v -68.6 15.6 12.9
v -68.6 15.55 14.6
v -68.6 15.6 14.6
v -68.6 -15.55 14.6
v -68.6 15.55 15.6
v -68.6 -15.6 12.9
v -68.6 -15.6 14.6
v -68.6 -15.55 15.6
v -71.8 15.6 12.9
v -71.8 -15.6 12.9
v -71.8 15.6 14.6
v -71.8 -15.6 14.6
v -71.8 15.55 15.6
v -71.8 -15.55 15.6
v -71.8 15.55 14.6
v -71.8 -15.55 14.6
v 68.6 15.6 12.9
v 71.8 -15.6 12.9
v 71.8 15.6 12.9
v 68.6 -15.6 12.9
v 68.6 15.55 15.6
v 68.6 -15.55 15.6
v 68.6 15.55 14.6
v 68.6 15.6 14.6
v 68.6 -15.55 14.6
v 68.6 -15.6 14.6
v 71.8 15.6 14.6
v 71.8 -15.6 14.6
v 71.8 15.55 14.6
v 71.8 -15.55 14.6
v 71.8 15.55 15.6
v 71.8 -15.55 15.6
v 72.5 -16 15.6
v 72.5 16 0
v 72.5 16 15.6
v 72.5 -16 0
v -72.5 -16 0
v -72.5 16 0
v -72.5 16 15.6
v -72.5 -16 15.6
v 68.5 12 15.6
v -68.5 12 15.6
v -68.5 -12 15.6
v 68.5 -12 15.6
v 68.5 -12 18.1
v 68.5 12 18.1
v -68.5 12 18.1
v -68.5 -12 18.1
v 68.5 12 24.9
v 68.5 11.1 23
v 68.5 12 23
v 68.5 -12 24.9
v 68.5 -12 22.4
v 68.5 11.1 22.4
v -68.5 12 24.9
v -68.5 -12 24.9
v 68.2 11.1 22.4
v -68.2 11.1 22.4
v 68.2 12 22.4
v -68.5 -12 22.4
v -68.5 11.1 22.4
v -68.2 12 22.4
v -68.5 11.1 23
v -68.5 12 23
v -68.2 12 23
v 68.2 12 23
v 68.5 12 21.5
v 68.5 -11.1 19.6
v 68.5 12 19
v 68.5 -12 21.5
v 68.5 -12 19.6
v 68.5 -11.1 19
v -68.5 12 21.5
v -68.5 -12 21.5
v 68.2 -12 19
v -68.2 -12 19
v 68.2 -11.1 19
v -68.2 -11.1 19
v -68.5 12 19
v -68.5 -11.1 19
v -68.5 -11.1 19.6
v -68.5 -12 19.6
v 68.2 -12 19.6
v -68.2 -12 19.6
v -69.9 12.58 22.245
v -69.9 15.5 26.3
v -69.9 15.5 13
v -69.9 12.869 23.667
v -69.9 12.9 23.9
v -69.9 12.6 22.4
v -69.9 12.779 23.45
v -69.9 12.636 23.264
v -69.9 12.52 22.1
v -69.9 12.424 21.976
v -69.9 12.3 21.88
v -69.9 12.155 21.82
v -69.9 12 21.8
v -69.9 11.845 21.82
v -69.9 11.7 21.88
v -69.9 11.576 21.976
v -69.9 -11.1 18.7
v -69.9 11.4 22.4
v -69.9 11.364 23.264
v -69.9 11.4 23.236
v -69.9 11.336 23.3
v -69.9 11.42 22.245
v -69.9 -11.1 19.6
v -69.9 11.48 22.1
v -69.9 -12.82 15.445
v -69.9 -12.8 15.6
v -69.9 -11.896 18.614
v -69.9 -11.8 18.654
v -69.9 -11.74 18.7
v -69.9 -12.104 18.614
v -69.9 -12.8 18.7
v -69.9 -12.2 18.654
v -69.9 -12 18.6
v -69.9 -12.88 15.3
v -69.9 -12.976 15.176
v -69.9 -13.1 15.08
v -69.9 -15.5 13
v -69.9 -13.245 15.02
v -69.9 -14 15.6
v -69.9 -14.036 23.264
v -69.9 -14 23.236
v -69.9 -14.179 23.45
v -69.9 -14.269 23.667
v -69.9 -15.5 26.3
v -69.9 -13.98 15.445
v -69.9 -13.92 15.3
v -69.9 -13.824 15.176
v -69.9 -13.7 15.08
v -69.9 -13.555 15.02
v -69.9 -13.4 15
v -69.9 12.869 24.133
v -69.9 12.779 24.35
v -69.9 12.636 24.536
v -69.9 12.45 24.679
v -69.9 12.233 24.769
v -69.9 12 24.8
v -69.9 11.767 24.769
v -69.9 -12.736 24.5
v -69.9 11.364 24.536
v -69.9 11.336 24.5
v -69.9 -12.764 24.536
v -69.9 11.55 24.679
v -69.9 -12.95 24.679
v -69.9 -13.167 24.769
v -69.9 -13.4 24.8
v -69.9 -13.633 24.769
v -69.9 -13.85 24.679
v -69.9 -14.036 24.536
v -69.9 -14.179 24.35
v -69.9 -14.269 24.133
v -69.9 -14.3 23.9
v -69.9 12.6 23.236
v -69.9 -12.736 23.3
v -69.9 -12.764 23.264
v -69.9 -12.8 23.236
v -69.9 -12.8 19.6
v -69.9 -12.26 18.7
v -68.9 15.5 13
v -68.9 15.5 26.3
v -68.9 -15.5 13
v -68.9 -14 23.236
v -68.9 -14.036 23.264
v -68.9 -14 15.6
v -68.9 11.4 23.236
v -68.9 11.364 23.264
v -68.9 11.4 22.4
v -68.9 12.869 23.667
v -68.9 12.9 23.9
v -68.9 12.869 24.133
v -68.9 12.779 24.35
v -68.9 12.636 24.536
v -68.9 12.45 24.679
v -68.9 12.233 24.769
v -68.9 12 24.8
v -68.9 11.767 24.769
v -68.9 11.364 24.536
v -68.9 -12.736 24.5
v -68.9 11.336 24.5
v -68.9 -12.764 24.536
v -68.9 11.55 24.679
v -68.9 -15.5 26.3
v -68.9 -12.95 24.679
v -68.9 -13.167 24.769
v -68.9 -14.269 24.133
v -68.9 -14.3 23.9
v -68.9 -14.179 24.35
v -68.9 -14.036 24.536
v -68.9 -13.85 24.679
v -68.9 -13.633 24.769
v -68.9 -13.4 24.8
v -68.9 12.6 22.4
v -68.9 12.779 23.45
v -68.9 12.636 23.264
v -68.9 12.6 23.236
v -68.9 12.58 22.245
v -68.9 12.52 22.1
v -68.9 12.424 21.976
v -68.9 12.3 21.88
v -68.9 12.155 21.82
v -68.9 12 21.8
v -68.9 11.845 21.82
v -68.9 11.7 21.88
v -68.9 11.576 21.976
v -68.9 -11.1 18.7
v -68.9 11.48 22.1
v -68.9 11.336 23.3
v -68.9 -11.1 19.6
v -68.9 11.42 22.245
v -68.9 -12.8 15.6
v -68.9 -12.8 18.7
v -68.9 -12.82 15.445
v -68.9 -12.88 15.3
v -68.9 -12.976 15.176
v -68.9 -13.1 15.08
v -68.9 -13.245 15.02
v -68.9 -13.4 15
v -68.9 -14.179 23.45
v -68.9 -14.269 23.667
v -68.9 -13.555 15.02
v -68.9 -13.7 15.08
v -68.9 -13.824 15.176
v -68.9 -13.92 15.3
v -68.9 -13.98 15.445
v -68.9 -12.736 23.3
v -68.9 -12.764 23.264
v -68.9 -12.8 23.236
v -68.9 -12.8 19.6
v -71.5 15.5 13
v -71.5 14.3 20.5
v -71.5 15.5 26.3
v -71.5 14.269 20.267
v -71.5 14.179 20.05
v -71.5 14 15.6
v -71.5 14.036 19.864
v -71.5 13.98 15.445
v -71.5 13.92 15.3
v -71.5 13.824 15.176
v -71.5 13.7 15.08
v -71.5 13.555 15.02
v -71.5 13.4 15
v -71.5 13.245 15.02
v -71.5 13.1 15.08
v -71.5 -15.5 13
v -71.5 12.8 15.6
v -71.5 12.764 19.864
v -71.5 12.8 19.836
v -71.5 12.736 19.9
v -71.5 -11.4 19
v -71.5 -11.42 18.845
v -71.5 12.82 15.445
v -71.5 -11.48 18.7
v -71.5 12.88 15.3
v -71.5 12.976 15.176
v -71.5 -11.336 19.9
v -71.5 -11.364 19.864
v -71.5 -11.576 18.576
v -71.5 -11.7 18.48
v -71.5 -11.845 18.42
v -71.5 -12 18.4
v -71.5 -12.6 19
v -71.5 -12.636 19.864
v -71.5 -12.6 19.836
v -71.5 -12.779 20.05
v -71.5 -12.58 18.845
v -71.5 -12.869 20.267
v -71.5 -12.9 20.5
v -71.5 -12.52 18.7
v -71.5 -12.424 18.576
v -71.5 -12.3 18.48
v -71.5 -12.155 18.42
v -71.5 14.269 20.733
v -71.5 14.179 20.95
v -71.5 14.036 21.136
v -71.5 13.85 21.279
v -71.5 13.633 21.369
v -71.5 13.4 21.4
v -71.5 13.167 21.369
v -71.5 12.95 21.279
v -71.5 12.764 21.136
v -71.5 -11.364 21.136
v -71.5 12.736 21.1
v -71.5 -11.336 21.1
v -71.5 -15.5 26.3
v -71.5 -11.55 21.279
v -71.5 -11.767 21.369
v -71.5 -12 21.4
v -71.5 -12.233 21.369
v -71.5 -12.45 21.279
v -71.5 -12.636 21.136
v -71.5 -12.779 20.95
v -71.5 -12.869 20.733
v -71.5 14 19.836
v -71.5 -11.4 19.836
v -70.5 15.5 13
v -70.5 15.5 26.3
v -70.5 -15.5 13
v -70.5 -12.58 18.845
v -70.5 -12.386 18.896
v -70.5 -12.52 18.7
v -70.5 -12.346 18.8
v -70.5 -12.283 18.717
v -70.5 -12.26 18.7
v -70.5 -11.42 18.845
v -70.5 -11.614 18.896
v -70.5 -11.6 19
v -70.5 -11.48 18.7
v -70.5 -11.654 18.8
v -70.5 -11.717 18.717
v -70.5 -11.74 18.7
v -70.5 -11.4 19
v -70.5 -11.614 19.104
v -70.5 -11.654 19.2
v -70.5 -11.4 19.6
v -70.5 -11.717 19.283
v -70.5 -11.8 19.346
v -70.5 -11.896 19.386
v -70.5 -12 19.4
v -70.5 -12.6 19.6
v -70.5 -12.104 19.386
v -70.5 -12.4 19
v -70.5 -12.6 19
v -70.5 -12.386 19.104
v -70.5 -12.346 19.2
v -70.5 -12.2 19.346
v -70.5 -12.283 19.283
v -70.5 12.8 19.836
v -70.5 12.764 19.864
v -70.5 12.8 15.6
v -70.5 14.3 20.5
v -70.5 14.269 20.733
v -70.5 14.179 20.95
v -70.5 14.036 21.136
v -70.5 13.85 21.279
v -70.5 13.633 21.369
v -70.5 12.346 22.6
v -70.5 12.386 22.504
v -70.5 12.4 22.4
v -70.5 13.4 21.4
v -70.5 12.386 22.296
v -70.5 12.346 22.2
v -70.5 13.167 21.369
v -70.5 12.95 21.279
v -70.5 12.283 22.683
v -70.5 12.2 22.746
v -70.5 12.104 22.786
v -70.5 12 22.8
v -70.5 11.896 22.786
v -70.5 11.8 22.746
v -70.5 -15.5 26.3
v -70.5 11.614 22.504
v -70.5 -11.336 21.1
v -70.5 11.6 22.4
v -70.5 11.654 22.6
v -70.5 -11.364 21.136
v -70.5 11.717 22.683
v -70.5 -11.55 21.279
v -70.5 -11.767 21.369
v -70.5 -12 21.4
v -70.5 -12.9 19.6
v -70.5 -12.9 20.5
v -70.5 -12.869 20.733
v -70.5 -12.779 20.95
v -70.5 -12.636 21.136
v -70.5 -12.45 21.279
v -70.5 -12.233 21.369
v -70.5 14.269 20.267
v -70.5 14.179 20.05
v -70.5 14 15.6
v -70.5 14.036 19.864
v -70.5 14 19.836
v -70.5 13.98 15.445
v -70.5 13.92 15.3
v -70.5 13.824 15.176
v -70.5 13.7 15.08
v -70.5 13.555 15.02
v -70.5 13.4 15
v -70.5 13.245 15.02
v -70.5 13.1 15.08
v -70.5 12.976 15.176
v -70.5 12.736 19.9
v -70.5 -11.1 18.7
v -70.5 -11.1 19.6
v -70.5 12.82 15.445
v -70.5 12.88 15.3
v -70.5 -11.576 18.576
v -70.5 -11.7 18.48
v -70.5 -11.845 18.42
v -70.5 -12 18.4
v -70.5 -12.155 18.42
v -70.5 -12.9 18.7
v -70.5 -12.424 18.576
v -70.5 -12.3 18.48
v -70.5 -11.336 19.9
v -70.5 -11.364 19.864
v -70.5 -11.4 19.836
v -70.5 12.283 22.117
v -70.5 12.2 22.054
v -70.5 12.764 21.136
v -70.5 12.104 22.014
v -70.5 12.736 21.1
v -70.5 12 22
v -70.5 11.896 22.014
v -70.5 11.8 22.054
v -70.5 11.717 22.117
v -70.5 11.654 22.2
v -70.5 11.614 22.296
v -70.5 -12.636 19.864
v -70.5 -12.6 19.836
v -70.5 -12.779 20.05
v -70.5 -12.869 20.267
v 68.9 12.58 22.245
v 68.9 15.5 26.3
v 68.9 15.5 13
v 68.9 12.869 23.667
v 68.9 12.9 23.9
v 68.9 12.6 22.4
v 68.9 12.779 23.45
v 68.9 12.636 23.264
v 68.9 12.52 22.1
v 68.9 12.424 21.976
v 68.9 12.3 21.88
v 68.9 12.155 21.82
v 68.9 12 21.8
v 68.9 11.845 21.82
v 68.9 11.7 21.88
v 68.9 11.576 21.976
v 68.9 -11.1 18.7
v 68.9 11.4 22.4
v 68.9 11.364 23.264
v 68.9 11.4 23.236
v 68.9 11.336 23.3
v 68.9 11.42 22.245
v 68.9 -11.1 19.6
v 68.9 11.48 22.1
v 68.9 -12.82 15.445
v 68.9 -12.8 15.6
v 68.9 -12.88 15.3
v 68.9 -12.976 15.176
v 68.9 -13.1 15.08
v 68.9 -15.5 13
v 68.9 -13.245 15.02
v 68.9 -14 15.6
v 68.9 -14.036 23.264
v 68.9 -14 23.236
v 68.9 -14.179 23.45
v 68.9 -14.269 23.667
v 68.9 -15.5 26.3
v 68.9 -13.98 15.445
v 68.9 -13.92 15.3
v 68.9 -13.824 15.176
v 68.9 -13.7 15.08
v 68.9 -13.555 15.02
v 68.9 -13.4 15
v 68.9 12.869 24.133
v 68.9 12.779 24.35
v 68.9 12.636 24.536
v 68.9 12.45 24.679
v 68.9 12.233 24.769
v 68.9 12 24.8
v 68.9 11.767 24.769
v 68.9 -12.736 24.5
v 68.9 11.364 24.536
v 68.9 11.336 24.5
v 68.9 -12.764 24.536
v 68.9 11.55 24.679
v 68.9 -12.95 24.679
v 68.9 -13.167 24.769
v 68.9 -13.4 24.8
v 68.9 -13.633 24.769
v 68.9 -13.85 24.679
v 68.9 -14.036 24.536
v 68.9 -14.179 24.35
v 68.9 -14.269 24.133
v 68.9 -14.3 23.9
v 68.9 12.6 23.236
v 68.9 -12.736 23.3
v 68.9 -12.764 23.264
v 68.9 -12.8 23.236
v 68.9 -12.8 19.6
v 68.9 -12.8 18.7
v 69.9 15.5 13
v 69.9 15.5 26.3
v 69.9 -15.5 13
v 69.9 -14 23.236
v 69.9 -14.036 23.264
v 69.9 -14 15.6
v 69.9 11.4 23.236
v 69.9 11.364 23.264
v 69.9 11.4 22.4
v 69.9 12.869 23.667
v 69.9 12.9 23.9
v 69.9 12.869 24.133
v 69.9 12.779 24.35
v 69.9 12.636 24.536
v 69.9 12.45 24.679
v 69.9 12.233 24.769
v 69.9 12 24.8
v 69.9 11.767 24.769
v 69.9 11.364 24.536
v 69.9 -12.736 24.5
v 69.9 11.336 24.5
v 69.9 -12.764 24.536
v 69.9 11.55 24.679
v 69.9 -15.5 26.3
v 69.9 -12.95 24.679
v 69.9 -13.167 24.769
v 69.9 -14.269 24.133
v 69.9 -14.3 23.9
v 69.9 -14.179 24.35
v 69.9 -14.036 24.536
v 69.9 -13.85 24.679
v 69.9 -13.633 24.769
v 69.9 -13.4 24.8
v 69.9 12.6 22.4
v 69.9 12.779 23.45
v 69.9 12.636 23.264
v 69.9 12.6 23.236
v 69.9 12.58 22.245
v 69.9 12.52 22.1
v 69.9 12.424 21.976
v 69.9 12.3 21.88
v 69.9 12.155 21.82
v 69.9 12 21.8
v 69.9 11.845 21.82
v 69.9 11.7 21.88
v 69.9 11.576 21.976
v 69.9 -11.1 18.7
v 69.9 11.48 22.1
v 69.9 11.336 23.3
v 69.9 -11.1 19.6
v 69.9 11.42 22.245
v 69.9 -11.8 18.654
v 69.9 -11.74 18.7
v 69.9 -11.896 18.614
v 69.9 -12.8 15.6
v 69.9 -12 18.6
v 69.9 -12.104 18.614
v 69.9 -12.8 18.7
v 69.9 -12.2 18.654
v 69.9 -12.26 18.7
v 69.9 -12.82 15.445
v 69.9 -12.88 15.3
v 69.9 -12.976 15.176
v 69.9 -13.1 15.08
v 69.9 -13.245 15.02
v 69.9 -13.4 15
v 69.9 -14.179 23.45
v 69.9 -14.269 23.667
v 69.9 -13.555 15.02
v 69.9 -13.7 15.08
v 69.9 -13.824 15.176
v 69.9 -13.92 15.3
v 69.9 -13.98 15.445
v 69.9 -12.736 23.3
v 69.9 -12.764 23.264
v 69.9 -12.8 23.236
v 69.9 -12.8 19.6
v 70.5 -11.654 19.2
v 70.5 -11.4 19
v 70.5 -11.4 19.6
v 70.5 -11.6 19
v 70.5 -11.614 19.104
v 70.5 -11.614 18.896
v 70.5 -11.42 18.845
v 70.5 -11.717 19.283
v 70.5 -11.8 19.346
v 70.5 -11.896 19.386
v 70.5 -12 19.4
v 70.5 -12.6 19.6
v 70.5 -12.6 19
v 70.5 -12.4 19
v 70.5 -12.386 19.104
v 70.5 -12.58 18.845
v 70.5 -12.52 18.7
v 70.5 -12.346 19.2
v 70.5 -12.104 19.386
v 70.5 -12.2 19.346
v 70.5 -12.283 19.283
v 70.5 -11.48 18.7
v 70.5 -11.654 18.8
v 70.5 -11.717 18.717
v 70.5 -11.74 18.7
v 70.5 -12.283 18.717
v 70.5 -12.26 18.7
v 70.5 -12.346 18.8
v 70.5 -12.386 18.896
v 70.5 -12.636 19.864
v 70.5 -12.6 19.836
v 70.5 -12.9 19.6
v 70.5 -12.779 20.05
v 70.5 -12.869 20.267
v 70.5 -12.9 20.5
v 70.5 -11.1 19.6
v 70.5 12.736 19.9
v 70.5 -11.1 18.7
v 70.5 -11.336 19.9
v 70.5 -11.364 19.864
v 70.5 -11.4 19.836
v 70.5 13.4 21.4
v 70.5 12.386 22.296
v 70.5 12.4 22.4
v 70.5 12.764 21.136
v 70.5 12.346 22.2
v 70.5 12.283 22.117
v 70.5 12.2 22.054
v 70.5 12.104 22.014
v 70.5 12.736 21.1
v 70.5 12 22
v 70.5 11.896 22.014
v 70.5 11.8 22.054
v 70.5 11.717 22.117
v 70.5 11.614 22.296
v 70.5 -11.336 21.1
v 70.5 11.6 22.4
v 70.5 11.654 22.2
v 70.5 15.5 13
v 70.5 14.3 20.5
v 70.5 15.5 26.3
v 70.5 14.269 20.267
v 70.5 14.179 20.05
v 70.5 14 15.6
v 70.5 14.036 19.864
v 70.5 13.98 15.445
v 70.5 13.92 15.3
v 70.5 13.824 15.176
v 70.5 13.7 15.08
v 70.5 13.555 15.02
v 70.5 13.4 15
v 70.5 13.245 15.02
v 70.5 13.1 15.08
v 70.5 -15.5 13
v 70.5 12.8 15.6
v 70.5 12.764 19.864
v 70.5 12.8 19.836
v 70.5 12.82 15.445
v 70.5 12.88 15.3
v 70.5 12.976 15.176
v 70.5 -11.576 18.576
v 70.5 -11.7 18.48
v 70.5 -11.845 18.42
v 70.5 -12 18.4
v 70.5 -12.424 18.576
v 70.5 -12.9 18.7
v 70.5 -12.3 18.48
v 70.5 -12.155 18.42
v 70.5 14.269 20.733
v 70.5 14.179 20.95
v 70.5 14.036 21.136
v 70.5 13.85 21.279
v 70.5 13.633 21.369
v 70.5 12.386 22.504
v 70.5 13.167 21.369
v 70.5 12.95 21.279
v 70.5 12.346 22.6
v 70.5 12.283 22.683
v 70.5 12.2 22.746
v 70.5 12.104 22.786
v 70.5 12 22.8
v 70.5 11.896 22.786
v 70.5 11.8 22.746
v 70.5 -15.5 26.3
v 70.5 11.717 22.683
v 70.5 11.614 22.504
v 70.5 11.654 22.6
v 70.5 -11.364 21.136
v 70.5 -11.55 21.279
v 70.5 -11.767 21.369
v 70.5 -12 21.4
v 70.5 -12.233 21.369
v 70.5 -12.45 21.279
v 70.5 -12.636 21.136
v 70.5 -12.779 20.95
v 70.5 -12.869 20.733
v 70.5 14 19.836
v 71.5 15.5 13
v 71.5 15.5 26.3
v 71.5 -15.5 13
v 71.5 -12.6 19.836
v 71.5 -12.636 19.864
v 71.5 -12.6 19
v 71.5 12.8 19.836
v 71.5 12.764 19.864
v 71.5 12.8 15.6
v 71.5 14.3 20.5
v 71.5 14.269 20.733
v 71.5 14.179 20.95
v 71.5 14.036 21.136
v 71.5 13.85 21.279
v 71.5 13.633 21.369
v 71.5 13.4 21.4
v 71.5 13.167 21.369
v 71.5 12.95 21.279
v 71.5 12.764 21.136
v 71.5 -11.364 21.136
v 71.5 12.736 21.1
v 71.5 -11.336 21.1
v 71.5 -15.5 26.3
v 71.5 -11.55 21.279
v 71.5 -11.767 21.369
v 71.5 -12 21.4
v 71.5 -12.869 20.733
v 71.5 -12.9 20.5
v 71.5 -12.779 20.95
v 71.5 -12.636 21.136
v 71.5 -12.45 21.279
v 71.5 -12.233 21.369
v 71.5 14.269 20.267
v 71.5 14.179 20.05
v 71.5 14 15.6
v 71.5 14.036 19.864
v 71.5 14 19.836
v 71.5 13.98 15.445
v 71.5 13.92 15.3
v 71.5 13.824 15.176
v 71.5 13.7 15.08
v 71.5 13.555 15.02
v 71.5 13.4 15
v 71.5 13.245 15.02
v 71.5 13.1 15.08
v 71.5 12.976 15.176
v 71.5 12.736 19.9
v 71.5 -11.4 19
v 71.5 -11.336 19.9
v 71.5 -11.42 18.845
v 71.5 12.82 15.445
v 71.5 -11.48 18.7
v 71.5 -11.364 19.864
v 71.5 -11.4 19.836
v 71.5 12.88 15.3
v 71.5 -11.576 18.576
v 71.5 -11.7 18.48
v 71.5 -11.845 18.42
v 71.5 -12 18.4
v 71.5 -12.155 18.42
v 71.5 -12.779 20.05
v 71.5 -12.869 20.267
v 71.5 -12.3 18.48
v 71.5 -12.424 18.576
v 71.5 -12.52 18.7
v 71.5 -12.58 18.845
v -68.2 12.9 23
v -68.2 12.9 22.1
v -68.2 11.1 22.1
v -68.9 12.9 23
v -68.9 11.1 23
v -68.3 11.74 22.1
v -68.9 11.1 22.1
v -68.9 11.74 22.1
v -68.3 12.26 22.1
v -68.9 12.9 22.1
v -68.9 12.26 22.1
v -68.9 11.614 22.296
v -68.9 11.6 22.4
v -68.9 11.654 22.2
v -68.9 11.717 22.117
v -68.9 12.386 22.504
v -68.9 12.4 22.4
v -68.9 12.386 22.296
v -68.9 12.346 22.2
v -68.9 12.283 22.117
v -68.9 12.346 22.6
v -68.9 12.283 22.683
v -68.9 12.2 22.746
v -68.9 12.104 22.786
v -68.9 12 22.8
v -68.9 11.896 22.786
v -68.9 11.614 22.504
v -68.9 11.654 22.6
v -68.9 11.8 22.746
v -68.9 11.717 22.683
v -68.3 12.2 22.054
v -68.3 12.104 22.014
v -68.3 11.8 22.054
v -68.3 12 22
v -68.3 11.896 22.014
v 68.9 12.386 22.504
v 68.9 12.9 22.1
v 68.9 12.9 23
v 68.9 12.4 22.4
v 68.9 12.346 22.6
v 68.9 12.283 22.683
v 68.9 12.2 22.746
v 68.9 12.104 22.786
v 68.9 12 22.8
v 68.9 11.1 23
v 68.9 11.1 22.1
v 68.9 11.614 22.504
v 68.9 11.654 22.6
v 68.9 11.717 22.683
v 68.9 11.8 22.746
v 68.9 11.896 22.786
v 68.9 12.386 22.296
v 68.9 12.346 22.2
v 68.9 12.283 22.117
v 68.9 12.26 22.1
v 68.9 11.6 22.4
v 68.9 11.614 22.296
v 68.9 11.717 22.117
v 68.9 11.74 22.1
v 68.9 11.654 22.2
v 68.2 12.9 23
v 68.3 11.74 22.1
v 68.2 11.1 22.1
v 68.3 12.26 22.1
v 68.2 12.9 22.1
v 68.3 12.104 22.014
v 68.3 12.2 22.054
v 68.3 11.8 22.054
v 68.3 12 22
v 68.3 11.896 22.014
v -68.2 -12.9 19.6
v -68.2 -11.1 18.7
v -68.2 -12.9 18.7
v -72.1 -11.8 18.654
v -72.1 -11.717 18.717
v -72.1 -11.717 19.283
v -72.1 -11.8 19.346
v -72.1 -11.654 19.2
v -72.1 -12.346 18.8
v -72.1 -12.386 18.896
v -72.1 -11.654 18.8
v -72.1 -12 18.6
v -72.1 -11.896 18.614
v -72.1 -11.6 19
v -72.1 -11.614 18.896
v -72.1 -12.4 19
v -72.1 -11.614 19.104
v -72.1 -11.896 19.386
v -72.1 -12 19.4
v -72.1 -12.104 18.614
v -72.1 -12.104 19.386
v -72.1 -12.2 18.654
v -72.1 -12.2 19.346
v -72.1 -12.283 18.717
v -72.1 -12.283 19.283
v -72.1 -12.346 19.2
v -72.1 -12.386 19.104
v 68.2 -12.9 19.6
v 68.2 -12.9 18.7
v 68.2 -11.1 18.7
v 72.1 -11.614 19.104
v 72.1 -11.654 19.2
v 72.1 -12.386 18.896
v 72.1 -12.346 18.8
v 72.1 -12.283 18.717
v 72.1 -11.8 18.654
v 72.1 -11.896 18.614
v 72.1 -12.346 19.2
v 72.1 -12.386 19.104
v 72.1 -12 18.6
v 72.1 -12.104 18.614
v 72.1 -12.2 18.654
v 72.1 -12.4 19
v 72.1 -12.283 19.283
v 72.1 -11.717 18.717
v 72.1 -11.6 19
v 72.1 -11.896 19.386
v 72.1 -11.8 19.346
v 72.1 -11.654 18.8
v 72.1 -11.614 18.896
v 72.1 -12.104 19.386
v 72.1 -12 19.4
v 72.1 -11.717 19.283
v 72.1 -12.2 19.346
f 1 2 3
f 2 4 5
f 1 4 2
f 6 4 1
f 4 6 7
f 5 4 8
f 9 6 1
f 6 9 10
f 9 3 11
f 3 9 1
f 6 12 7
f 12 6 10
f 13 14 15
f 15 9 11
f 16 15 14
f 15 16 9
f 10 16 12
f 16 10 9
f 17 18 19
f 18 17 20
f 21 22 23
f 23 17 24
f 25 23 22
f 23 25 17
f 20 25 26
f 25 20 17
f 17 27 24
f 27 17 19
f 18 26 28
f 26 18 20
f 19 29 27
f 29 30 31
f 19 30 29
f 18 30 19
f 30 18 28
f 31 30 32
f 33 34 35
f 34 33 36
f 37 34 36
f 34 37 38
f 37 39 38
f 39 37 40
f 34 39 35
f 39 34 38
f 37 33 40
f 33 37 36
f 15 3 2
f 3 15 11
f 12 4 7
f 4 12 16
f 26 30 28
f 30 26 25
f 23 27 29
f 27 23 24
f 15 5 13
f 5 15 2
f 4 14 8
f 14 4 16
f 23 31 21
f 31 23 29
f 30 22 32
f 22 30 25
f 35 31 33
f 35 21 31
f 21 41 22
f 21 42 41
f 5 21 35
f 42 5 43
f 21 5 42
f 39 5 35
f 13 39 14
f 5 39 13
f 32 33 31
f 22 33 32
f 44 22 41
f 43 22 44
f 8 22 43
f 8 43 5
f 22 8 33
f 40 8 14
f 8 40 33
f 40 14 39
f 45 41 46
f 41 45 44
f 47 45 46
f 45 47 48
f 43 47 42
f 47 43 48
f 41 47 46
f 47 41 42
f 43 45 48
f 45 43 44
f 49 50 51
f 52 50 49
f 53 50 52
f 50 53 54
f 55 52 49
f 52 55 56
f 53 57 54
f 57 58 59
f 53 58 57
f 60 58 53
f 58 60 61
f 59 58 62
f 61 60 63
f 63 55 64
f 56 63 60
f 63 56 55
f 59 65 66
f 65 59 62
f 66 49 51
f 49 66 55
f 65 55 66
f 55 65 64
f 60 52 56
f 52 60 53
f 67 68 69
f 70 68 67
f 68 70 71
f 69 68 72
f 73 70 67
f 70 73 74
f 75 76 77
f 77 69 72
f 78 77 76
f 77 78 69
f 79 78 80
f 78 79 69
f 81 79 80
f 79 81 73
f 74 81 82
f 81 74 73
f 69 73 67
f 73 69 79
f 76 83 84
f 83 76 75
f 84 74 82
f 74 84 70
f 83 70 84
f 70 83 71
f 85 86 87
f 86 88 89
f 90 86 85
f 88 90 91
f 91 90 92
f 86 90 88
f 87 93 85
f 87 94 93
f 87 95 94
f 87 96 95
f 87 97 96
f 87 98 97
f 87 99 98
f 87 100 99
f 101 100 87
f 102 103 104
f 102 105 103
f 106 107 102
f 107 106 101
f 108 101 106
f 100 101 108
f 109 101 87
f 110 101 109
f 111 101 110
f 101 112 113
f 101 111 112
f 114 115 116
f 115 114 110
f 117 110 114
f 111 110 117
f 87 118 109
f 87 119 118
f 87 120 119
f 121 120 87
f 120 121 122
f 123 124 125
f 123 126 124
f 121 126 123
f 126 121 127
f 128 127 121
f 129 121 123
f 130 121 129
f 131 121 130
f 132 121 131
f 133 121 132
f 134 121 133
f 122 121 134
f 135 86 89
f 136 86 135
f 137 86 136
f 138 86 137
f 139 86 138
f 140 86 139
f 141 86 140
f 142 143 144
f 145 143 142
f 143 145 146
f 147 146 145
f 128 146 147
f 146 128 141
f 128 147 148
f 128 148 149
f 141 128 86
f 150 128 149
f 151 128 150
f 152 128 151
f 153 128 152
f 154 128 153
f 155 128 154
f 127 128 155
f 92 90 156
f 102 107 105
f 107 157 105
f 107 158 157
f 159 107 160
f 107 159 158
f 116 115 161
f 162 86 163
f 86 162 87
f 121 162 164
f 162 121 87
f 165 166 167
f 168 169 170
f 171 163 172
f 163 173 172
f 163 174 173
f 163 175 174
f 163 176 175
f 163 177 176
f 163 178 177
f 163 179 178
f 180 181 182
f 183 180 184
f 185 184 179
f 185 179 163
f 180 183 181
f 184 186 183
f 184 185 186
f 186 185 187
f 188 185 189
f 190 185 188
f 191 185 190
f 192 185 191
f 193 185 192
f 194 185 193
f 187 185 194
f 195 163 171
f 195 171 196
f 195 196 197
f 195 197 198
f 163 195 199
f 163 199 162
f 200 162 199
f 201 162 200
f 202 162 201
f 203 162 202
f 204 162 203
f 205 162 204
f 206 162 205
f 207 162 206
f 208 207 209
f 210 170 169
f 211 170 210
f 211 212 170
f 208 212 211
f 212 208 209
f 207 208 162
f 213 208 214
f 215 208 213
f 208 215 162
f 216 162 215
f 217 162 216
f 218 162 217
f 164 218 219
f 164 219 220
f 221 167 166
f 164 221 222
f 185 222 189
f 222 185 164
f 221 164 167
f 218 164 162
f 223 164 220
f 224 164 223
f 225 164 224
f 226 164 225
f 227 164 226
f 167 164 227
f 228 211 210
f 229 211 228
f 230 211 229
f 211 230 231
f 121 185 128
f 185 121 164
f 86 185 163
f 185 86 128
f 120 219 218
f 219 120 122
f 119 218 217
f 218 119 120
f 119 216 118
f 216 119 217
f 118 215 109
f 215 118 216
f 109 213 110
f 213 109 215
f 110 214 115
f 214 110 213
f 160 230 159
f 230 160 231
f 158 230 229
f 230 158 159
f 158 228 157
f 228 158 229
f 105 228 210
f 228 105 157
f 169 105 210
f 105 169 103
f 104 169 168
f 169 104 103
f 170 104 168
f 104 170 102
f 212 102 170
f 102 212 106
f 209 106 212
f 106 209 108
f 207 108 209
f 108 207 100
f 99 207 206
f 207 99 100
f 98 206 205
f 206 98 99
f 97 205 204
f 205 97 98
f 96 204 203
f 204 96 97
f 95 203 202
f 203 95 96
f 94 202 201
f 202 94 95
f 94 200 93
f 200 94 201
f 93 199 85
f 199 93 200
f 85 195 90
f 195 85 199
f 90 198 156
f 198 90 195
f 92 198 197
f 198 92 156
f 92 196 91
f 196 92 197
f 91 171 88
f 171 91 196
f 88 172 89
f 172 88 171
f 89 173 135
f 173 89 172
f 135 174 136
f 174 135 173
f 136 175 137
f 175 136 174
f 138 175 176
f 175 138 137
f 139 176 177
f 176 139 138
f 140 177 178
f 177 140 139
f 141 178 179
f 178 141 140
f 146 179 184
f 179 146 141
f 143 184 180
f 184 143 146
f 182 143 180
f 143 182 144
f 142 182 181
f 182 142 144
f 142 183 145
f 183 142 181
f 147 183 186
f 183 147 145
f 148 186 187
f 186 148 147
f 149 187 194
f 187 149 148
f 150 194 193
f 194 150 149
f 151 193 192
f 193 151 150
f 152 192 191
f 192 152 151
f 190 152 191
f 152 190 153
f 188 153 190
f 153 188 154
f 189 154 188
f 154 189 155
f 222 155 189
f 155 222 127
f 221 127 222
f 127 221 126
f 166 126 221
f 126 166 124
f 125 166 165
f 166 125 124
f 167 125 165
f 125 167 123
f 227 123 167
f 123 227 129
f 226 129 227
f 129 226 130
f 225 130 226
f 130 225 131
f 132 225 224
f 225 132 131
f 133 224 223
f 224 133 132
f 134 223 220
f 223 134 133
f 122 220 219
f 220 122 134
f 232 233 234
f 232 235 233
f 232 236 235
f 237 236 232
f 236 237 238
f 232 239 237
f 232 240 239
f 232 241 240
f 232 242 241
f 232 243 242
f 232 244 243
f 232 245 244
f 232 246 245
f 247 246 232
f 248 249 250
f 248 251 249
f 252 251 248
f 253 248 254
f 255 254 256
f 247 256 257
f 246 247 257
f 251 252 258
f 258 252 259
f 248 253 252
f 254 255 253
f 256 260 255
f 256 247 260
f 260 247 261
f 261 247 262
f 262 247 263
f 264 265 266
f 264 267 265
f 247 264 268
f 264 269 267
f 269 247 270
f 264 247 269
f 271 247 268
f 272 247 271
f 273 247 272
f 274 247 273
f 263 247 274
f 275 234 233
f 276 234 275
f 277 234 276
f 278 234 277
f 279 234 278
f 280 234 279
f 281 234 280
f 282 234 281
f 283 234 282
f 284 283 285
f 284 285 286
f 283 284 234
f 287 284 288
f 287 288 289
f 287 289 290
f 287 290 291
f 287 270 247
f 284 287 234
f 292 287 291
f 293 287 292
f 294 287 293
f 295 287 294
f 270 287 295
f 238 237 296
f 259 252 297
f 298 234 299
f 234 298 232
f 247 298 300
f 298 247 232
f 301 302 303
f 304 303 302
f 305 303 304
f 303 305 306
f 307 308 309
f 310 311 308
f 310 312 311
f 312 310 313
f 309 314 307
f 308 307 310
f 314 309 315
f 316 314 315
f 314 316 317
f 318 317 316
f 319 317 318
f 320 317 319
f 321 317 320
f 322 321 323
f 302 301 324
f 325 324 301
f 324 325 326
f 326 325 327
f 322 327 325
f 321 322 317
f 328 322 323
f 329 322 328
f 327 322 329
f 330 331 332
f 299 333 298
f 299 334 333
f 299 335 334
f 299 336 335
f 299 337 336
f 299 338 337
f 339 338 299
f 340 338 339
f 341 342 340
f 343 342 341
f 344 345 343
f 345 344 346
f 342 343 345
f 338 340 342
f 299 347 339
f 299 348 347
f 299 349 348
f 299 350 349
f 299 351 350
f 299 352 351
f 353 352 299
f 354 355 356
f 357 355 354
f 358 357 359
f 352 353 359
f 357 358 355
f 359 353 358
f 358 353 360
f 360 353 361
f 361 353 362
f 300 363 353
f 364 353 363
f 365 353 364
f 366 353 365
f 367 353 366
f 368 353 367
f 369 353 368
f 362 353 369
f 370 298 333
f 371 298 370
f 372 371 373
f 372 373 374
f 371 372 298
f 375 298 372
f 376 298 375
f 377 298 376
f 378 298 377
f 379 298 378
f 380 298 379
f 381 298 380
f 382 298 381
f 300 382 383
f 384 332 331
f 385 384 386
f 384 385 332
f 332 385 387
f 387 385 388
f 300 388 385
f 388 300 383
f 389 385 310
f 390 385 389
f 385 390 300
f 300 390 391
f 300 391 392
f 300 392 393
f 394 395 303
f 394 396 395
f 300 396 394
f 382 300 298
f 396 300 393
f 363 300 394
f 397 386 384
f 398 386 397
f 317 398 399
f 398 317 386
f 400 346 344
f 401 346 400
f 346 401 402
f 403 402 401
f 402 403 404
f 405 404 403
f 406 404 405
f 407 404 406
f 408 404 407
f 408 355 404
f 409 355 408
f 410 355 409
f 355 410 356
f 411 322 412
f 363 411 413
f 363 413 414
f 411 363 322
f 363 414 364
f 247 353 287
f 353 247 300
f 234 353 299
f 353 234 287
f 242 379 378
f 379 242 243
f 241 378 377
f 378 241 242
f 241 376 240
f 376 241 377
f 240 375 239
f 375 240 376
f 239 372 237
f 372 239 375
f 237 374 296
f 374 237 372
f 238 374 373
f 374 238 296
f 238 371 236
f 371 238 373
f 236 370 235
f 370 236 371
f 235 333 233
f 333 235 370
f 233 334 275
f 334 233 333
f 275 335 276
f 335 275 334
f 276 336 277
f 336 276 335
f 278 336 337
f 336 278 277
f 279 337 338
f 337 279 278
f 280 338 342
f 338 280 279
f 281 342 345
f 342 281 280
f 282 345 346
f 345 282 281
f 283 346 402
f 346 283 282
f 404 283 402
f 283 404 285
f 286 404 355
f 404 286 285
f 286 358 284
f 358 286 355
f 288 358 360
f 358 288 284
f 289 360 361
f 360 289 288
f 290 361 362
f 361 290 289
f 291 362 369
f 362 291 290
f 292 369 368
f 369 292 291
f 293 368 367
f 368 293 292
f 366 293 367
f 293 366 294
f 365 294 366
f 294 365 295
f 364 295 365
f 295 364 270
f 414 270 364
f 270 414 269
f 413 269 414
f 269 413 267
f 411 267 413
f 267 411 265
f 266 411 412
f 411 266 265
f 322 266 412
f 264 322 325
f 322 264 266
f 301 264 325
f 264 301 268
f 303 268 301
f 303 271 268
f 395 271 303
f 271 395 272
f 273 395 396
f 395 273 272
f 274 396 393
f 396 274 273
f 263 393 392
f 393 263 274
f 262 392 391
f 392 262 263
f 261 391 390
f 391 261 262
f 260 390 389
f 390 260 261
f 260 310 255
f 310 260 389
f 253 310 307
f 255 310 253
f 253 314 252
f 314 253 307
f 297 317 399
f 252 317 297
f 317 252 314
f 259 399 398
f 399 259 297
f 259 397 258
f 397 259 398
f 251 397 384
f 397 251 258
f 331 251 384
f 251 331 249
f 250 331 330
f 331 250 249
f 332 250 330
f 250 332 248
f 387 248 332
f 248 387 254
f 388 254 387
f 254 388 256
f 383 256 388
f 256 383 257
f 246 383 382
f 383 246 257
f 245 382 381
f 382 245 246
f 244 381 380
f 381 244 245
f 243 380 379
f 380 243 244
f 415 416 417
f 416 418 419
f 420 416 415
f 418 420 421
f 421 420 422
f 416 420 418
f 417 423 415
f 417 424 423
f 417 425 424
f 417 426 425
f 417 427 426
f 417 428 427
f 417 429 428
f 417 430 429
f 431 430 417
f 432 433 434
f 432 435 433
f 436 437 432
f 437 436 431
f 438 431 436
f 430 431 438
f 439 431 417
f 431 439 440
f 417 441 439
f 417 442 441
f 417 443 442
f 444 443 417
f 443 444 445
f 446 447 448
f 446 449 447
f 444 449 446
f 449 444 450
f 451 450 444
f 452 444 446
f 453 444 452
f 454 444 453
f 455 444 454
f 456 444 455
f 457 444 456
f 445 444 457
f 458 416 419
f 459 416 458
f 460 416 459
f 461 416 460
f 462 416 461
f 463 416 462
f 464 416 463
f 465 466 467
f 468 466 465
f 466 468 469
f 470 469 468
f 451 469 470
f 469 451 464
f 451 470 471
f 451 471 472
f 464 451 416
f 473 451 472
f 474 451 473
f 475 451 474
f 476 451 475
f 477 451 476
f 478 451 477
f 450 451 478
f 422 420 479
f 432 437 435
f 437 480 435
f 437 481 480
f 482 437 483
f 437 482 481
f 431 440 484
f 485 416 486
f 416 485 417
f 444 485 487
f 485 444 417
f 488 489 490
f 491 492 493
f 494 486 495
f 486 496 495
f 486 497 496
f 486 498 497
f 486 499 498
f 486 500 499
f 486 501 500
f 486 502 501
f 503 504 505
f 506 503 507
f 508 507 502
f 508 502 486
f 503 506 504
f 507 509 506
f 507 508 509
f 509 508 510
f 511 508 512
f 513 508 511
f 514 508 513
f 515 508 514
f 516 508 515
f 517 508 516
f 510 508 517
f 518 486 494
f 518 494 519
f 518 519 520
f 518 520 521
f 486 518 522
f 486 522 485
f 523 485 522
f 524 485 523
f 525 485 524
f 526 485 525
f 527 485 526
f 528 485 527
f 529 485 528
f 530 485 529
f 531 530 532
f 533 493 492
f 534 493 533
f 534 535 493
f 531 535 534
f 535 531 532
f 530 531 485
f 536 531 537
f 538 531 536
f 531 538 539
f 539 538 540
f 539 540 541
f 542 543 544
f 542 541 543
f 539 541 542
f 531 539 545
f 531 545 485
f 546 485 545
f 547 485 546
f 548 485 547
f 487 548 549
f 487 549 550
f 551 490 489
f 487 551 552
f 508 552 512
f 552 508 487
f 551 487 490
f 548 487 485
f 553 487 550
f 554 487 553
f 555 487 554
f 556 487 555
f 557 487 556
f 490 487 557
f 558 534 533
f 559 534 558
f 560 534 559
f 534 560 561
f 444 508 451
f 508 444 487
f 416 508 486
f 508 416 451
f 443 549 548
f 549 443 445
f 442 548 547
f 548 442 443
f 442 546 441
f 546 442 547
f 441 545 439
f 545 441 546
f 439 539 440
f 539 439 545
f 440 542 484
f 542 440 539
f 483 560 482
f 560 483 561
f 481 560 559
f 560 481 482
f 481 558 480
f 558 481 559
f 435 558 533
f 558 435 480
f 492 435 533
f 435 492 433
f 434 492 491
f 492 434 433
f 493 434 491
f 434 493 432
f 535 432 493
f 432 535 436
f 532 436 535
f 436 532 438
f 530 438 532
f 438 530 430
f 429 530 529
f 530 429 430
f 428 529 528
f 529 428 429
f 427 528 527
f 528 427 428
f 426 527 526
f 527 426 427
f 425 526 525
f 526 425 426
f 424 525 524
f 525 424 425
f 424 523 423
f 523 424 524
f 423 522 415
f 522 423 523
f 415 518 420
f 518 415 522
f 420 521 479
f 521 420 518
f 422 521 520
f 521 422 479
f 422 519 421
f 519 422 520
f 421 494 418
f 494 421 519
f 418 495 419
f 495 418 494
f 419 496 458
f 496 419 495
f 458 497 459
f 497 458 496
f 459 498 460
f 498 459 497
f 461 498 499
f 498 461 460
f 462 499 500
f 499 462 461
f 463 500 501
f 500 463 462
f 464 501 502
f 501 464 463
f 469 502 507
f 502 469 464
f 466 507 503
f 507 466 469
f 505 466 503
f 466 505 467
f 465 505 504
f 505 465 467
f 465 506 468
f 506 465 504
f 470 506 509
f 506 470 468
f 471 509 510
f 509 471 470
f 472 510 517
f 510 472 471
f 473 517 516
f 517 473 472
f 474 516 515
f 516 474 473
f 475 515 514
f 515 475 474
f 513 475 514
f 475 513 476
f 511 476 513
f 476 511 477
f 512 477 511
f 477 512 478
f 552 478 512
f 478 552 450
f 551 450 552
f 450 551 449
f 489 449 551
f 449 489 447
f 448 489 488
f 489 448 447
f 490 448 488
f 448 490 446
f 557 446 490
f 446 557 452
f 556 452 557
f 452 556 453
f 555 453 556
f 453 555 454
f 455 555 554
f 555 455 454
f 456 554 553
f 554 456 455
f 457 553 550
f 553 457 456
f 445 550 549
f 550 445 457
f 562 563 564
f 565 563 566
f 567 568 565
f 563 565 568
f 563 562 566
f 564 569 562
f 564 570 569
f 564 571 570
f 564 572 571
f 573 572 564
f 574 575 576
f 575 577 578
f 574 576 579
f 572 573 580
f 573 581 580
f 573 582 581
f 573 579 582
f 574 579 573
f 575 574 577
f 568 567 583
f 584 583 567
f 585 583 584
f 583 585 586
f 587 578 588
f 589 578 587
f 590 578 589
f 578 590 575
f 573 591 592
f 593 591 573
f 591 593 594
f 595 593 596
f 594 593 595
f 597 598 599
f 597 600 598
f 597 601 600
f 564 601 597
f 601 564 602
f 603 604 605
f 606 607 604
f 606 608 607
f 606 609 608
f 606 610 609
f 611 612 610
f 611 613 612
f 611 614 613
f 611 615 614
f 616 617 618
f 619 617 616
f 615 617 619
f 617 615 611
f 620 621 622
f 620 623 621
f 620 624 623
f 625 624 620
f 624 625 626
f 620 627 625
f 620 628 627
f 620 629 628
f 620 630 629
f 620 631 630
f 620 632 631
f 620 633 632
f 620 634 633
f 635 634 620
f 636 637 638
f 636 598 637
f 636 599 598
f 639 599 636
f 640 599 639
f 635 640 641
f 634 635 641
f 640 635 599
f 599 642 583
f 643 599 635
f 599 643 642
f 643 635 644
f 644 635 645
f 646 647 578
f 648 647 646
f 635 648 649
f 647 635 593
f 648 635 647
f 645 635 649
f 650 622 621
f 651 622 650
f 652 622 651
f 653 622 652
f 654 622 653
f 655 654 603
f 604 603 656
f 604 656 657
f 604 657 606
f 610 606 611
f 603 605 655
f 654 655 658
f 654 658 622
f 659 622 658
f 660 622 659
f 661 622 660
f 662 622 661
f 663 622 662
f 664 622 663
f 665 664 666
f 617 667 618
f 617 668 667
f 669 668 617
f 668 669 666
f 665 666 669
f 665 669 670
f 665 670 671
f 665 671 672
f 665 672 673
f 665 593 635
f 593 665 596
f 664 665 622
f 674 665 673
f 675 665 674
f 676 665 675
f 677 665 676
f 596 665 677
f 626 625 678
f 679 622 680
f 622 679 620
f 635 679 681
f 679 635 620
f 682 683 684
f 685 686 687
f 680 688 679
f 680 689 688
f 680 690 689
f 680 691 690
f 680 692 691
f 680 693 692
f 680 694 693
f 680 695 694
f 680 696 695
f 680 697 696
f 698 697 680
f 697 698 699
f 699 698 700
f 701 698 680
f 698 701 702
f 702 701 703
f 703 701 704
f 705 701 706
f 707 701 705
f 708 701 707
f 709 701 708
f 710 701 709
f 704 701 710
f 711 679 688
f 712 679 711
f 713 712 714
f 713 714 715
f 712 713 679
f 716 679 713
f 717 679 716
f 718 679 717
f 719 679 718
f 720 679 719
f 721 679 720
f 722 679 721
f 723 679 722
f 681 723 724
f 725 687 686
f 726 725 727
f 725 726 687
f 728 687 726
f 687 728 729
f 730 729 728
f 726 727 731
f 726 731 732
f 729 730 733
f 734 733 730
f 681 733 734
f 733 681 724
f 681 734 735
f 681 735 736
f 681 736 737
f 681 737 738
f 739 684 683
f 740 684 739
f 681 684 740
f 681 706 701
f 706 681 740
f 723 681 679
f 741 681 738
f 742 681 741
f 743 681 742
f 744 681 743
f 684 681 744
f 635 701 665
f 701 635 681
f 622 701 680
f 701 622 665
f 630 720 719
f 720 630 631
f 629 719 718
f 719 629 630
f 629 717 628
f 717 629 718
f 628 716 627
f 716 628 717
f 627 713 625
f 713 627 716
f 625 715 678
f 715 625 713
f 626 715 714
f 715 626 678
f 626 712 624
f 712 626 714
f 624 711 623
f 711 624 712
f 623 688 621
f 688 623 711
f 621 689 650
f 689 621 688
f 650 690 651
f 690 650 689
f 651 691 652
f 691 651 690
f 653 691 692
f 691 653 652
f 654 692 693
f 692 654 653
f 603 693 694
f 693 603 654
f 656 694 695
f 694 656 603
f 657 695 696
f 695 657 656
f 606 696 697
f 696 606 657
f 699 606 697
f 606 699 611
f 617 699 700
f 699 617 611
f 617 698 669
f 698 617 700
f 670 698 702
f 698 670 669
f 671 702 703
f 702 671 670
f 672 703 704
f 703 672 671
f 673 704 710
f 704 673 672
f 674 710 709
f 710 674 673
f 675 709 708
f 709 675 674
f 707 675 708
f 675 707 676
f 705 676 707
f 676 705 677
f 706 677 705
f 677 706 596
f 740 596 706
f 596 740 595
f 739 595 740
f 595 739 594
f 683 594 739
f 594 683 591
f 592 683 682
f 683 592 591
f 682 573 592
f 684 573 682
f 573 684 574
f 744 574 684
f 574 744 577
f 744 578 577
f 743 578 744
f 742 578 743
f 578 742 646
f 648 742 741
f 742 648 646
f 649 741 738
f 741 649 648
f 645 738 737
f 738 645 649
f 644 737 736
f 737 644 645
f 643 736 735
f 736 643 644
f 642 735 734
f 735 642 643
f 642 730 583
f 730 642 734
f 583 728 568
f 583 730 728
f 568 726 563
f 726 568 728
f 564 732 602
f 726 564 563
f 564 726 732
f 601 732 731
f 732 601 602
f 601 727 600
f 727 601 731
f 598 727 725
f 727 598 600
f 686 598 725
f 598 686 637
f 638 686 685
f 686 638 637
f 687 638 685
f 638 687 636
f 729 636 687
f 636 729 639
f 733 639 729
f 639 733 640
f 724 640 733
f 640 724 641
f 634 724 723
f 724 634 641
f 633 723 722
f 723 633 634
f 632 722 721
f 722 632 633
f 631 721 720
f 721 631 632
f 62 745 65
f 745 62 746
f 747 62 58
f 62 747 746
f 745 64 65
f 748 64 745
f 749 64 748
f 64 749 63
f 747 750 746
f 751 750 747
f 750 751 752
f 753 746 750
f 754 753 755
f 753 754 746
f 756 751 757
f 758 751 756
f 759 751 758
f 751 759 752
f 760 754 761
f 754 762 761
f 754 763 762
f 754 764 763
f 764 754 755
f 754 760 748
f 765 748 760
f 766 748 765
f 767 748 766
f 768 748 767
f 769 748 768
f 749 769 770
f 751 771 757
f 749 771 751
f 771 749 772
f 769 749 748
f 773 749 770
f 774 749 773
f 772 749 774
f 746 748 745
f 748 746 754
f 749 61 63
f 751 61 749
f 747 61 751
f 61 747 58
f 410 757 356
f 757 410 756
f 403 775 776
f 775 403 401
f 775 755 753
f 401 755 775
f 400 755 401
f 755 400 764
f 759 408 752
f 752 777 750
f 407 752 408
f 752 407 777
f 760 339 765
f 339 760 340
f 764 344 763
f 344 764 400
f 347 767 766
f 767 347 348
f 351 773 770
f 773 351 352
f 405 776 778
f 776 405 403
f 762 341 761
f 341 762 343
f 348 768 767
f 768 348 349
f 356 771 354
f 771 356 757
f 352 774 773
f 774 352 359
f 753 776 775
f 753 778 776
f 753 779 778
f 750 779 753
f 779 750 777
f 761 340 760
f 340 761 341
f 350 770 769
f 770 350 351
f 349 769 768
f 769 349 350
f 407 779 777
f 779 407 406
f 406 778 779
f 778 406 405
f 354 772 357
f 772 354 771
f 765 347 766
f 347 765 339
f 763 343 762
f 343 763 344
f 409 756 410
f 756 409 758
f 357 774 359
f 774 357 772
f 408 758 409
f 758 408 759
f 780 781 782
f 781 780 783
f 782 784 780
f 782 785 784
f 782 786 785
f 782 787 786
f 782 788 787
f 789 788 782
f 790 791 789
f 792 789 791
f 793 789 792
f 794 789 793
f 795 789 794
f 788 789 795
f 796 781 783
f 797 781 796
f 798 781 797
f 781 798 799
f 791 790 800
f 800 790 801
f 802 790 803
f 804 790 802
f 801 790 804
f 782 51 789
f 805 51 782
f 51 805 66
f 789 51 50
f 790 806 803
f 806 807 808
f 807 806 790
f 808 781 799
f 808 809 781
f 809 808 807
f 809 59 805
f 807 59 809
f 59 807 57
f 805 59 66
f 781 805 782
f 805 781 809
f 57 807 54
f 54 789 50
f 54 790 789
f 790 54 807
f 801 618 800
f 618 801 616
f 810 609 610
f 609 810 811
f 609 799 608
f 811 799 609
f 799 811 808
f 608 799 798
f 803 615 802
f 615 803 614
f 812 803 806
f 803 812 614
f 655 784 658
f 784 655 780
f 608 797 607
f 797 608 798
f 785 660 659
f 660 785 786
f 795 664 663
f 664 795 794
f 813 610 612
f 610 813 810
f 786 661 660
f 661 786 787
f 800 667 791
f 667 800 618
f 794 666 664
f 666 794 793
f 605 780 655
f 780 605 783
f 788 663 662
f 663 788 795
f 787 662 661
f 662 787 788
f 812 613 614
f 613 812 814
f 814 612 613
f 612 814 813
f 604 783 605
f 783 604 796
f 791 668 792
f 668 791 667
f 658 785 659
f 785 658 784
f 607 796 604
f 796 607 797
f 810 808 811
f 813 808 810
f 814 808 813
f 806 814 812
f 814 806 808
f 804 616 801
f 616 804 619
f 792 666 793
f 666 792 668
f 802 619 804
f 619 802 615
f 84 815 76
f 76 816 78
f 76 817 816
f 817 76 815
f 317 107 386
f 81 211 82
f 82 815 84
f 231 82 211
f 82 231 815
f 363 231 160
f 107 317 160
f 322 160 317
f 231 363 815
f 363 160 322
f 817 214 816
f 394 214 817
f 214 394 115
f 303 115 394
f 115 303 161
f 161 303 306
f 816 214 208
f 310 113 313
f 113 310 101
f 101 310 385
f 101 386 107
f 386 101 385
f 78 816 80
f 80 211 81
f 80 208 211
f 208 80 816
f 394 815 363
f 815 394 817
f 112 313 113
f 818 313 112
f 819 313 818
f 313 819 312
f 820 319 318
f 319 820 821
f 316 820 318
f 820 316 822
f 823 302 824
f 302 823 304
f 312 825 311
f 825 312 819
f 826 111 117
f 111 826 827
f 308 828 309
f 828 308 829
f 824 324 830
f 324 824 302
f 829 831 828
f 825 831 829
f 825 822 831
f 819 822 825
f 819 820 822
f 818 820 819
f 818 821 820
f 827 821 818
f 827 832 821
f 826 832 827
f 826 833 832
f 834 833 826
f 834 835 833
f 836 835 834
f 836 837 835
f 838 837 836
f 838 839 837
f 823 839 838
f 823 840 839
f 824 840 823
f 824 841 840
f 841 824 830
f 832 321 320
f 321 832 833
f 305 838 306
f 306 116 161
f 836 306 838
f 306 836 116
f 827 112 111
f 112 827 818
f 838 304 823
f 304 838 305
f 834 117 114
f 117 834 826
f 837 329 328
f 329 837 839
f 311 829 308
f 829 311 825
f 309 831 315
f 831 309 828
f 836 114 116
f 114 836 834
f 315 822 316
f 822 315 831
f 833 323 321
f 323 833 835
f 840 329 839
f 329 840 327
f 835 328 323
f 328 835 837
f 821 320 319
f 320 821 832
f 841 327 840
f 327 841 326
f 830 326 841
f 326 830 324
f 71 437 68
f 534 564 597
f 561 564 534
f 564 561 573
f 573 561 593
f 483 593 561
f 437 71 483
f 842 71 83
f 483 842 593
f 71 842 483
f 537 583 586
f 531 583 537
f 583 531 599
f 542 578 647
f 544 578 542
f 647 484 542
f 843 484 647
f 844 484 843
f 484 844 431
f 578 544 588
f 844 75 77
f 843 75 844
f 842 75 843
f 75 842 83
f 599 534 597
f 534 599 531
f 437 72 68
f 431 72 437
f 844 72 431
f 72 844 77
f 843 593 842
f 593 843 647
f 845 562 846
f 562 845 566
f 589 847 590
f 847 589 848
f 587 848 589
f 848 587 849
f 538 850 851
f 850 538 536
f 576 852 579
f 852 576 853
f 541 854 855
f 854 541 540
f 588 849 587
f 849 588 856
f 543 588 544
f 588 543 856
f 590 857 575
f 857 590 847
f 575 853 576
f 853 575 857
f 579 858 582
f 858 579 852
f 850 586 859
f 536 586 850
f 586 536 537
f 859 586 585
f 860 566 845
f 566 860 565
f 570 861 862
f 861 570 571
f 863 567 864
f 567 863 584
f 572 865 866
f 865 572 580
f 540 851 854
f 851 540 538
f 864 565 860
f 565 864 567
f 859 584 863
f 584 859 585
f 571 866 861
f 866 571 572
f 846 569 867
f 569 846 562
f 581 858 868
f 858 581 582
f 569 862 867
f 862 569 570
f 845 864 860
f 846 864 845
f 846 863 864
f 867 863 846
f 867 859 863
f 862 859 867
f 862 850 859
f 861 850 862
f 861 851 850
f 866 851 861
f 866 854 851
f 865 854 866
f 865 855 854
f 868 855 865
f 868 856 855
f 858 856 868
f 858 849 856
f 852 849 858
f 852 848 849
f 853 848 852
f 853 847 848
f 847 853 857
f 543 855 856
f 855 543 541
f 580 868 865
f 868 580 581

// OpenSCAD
// NEXUS ONE — MECH-B staged guide cassette v0.3
// Split end plates with vertical-lift / straight-slide / vertical-lower slots.
// v0.3 changes vs v0.2 (see reports/REPORT_v0_3.md):
//  1. plate_z_low -1.0 -> -2.6 and plate_z_high 9.5 -> 10.7: thinnest slot
//     walls go from 0.4 mm (lower) / 0.6 mm (left upper) to 2.0 / 1.8 mm.
//     Plates now socket 2.6 mm into the spine top (sockets cut in frame()).
//  2. Slot corners get relief circles (slot_w + 0.6) so the 0.8 mm pin has
//     room to turn the 90-degree corners instead of hitting a sharp corner.
//     NOTE: pin MOTION is still the sharp staged path; relief is clearance,
//     not a smoothed motion profile. Motion smoothing stays an open item.
//  3. Deployment sequence is now a documented constraint (validator check D):
//     LEFT wing deploys FIRST, RIGHT wing folds FIRST. Moving the right wing
//     while the left is folded collides (0.6 mm Z interference, 721/1001
//     sampled poses in the rebuilt checker). A physical unit needs a
//     sequence interlock or a geometry change - not yet designed.
// Concept geometry only: OpenSCAD rendering and physical fit are not yet verified.
// OpenSCAD: View > Animate, Steps=201, FPS=20, then enable Animate.
// X = panel length; Y = lateral deployment; Z = normal to panel.

$fn=24;
panel_l=137;
panel_w=24;
panel_t=2.5;
pitch=3.4;
lift=1.5;
spine_l=145;
spine_w=32;
spine_h=14;
deck_a=0.6;
deck_b=1.0;
base_z=spine_h+deck_a+deck_b;
plate_y_half=15.5;
plate_z_low=-2.6;
plate_z_high=10.7;
plate_t=1.0;
pocket_x=1.6;
slot_w=1.2;
pin_d=0.8;
tab_y=1.8;
lift_fraction=0.15;
slide_fraction=0.70;
lower_fraction=0.15;
show_frame=true;
show_panels=true;
show_plates=true;
show_mounts=true;

function y_start()=-panel_w/2;
function y_end(side)= side<0 ? -37.4 : 13.4;
function start_z(side)=side<0 ? 2*pitch : pitch;
function peak_z(side)=start_z(side)+lift;
function station_x(side)=side<0 ? 69.4 : 71.0;
function panel_y(side,u)=
    u<lift_fraction ? y_start()
    : u<lift_fraction+slide_fraction
      ? y_start()+(y_end(side)-y_start())*((u-lift_fraction)/slide_fraction)
      : y_end(side);
function panel_z(side,u)=
    u<lift_fraction ? start_z(side)+lift*(u/lift_fraction)
    : u<lift_fraction+slide_fraction ? peak_z(side)
    : peak_z(side)*(1-(u-lift_fraction-slide_fraction)/lower_fraction);
function pin_y(side,u)=side<0 ? panel_y(side,u)+panel_w : panel_y(side,u);
function slot_points(side)=side<0
    ? [[12,6.8],[12,8.3],[-13.4,8.3],[-13.4,0]]
    : [[-12,3.4],[-12,4.9],[13.4,4.9],[13.4,0]];

module slot_stroke(pts,w) {
    union() {
        for (i=[0:len(pts)-2]) hull() {
            translate(pts[i]) circle(d=w);
            translate(pts[i+1]) circle(d=w);
        }
        // v0.3 corner relief: widen each interior corner so the pin can turn.
        for (i=[1:len(pts)-2])
            translate(pts[i]) circle(d=w+0.6);
    }
}

module guide_plate(side,xcenter) {
    pts=slot_points(side);
    color(side<0 ? [0.92,0.53,0.16,0.92] : [0.12,0.66,0.59,0.92])
    multmatrix([[0,0,1,xcenter-plate_t/2],
                [1,0,0,0],
                [0,1,0,base_z],
                [0,0,0,1]]) {
        difference() {
            linear_extrude(height=plate_t)
                polygon(points=[[-plate_y_half,plate_z_low],
                                [ plate_y_half,plate_z_low],
                                [ plate_y_half,plate_z_high],
                                [-plate_y_half,plate_z_high]]);
            translate([0,0,-0.1])
                linear_extrude(height=plate_t+0.2)
                    slot_stroke(pts,slot_w);
        }
    }
}

module guide_plates() {
    for (sx=[-1,1]) {
        guide_plate(-1,sx*station_x(-1));
        guide_plate( 1,sx*station_x( 1));
    }
}

module deck_top_with_cassette_pockets() {
    difference() {
        color([0.64,0.67,0.72,0.96])
        translate([-spine_l/2,-spine_w/2,spine_h+deck_a])
            cube([spine_l,spine_w,deck_b]);
        // Four shallow pockets let the independent guide plates sit on the top deck.
        for (sx=[-1,1]) for (side=[-1,1])
            translate([sx*station_x(side)-pocket_x/2,
                       -plate_y_half-0.05,
                       spine_h+deck_a-0.05])
                cube([pocket_x,2*plate_y_half+0.1,deck_b+0.1]);
    }
}

module plate_sockets(z0,z1) {
    // v0.3: plates extend to base_z+plate_z_low, so they socket through the
    // decks and 1.0 mm into the spine top. Adjacent plate bands at one end
    // merge into one socket (bands are 1.6 mm apart, sockets 1.6 mm wide).
    for (sx=[-1,1]) for (side=[-1,1])
        translate([sx*station_x(side)-(plate_t+0.6)/2,
                   -plate_y_half-0.1,
                   z0])
            cube([plate_t+0.6,2*plate_y_half+0.2,z1-z0]);
}

module frame() {
    color([0.20,0.23,0.29,1])
    difference() {
        translate([-spine_l/2,-spine_w/2,0])
            cube([spine_l,spine_w,spine_h]);
        plate_sockets(spine_h-1.1,spine_h+0.1);
    }
    color([0.47,0.50,0.56,1])
    difference() {
        translate([-spine_l/2,-spine_w/2,spine_h])
            cube([spine_l,spine_w,deck_a]);
        plate_sockets(spine_h-0.1,spine_h+deck_a+0.1);
    }
    deck_top_with_cassette_pockets();
}

module panel(y,z,c) {
    color(c) translate([-panel_l/2,y,z]) cube([panel_l,panel_w,panel_t]);
}

module wing_mounts(side,u) {
    yy=pin_y(side,u);
    zz=base_z+panel_z(side,u);
    xx=station_x(side);
    for (sx=[-1,1]) {
        xcenter=sx*xx;
        xedge=sx*(panel_l/2-0.30);
        // Stop the arm at the plate's inner face; pin spans through the slot.
        xinner=xcenter-sx*plate_t/2;
        xlo=min(xedge,xinner);
        xhi=max(xedge,xinner);
        if (show_mounts)
            color(side<0 ? [0.72,0.35,0.12,1] : [0.08,0.46,0.42,1])
            translate([xlo,yy-tab_y/2,zz-0.30])
                cube([xhi-xlo,tab_y,0.90]);
        if (show_mounts)
            color([0.93,0.76,0.20,1])
            translate([xcenter,yy,zz])
                rotate([0,90,0]) cylinder(h=plate_t+1.2,d=pin_d,center=true);
    }
}

u=min(1,max(0,$t));
if (show_frame) frame();
if (show_panels) {
    panel(y_start(),base_z,[0.16,0.43,0.86,0.96]);
    panel(panel_y(-1,u),base_z+panel_z(-1,u),[0.90,0.31,0.20,0.93]);
    panel(panel_y( 1,u),base_z+panel_z( 1,u),[0.15,0.67,0.49,0.93]);
}
if (show_plates) guide_plates();
wing_mounts(-1,u);
wing_mounts( 1,u);

// Slot centre-lines use follower positions, not panel centres:
// left: Y=+12 -> -13.4; right: Y=-12 -> +13.4.
// Three stages are discrete in this preview. v0.3 adds corner relief clearance
// and thicker slot walls, but a smoothed motion profile, pin retention,
// sequence interlock, assembly access, cover, flex routing and
// material/tolerance behavior remain open.
